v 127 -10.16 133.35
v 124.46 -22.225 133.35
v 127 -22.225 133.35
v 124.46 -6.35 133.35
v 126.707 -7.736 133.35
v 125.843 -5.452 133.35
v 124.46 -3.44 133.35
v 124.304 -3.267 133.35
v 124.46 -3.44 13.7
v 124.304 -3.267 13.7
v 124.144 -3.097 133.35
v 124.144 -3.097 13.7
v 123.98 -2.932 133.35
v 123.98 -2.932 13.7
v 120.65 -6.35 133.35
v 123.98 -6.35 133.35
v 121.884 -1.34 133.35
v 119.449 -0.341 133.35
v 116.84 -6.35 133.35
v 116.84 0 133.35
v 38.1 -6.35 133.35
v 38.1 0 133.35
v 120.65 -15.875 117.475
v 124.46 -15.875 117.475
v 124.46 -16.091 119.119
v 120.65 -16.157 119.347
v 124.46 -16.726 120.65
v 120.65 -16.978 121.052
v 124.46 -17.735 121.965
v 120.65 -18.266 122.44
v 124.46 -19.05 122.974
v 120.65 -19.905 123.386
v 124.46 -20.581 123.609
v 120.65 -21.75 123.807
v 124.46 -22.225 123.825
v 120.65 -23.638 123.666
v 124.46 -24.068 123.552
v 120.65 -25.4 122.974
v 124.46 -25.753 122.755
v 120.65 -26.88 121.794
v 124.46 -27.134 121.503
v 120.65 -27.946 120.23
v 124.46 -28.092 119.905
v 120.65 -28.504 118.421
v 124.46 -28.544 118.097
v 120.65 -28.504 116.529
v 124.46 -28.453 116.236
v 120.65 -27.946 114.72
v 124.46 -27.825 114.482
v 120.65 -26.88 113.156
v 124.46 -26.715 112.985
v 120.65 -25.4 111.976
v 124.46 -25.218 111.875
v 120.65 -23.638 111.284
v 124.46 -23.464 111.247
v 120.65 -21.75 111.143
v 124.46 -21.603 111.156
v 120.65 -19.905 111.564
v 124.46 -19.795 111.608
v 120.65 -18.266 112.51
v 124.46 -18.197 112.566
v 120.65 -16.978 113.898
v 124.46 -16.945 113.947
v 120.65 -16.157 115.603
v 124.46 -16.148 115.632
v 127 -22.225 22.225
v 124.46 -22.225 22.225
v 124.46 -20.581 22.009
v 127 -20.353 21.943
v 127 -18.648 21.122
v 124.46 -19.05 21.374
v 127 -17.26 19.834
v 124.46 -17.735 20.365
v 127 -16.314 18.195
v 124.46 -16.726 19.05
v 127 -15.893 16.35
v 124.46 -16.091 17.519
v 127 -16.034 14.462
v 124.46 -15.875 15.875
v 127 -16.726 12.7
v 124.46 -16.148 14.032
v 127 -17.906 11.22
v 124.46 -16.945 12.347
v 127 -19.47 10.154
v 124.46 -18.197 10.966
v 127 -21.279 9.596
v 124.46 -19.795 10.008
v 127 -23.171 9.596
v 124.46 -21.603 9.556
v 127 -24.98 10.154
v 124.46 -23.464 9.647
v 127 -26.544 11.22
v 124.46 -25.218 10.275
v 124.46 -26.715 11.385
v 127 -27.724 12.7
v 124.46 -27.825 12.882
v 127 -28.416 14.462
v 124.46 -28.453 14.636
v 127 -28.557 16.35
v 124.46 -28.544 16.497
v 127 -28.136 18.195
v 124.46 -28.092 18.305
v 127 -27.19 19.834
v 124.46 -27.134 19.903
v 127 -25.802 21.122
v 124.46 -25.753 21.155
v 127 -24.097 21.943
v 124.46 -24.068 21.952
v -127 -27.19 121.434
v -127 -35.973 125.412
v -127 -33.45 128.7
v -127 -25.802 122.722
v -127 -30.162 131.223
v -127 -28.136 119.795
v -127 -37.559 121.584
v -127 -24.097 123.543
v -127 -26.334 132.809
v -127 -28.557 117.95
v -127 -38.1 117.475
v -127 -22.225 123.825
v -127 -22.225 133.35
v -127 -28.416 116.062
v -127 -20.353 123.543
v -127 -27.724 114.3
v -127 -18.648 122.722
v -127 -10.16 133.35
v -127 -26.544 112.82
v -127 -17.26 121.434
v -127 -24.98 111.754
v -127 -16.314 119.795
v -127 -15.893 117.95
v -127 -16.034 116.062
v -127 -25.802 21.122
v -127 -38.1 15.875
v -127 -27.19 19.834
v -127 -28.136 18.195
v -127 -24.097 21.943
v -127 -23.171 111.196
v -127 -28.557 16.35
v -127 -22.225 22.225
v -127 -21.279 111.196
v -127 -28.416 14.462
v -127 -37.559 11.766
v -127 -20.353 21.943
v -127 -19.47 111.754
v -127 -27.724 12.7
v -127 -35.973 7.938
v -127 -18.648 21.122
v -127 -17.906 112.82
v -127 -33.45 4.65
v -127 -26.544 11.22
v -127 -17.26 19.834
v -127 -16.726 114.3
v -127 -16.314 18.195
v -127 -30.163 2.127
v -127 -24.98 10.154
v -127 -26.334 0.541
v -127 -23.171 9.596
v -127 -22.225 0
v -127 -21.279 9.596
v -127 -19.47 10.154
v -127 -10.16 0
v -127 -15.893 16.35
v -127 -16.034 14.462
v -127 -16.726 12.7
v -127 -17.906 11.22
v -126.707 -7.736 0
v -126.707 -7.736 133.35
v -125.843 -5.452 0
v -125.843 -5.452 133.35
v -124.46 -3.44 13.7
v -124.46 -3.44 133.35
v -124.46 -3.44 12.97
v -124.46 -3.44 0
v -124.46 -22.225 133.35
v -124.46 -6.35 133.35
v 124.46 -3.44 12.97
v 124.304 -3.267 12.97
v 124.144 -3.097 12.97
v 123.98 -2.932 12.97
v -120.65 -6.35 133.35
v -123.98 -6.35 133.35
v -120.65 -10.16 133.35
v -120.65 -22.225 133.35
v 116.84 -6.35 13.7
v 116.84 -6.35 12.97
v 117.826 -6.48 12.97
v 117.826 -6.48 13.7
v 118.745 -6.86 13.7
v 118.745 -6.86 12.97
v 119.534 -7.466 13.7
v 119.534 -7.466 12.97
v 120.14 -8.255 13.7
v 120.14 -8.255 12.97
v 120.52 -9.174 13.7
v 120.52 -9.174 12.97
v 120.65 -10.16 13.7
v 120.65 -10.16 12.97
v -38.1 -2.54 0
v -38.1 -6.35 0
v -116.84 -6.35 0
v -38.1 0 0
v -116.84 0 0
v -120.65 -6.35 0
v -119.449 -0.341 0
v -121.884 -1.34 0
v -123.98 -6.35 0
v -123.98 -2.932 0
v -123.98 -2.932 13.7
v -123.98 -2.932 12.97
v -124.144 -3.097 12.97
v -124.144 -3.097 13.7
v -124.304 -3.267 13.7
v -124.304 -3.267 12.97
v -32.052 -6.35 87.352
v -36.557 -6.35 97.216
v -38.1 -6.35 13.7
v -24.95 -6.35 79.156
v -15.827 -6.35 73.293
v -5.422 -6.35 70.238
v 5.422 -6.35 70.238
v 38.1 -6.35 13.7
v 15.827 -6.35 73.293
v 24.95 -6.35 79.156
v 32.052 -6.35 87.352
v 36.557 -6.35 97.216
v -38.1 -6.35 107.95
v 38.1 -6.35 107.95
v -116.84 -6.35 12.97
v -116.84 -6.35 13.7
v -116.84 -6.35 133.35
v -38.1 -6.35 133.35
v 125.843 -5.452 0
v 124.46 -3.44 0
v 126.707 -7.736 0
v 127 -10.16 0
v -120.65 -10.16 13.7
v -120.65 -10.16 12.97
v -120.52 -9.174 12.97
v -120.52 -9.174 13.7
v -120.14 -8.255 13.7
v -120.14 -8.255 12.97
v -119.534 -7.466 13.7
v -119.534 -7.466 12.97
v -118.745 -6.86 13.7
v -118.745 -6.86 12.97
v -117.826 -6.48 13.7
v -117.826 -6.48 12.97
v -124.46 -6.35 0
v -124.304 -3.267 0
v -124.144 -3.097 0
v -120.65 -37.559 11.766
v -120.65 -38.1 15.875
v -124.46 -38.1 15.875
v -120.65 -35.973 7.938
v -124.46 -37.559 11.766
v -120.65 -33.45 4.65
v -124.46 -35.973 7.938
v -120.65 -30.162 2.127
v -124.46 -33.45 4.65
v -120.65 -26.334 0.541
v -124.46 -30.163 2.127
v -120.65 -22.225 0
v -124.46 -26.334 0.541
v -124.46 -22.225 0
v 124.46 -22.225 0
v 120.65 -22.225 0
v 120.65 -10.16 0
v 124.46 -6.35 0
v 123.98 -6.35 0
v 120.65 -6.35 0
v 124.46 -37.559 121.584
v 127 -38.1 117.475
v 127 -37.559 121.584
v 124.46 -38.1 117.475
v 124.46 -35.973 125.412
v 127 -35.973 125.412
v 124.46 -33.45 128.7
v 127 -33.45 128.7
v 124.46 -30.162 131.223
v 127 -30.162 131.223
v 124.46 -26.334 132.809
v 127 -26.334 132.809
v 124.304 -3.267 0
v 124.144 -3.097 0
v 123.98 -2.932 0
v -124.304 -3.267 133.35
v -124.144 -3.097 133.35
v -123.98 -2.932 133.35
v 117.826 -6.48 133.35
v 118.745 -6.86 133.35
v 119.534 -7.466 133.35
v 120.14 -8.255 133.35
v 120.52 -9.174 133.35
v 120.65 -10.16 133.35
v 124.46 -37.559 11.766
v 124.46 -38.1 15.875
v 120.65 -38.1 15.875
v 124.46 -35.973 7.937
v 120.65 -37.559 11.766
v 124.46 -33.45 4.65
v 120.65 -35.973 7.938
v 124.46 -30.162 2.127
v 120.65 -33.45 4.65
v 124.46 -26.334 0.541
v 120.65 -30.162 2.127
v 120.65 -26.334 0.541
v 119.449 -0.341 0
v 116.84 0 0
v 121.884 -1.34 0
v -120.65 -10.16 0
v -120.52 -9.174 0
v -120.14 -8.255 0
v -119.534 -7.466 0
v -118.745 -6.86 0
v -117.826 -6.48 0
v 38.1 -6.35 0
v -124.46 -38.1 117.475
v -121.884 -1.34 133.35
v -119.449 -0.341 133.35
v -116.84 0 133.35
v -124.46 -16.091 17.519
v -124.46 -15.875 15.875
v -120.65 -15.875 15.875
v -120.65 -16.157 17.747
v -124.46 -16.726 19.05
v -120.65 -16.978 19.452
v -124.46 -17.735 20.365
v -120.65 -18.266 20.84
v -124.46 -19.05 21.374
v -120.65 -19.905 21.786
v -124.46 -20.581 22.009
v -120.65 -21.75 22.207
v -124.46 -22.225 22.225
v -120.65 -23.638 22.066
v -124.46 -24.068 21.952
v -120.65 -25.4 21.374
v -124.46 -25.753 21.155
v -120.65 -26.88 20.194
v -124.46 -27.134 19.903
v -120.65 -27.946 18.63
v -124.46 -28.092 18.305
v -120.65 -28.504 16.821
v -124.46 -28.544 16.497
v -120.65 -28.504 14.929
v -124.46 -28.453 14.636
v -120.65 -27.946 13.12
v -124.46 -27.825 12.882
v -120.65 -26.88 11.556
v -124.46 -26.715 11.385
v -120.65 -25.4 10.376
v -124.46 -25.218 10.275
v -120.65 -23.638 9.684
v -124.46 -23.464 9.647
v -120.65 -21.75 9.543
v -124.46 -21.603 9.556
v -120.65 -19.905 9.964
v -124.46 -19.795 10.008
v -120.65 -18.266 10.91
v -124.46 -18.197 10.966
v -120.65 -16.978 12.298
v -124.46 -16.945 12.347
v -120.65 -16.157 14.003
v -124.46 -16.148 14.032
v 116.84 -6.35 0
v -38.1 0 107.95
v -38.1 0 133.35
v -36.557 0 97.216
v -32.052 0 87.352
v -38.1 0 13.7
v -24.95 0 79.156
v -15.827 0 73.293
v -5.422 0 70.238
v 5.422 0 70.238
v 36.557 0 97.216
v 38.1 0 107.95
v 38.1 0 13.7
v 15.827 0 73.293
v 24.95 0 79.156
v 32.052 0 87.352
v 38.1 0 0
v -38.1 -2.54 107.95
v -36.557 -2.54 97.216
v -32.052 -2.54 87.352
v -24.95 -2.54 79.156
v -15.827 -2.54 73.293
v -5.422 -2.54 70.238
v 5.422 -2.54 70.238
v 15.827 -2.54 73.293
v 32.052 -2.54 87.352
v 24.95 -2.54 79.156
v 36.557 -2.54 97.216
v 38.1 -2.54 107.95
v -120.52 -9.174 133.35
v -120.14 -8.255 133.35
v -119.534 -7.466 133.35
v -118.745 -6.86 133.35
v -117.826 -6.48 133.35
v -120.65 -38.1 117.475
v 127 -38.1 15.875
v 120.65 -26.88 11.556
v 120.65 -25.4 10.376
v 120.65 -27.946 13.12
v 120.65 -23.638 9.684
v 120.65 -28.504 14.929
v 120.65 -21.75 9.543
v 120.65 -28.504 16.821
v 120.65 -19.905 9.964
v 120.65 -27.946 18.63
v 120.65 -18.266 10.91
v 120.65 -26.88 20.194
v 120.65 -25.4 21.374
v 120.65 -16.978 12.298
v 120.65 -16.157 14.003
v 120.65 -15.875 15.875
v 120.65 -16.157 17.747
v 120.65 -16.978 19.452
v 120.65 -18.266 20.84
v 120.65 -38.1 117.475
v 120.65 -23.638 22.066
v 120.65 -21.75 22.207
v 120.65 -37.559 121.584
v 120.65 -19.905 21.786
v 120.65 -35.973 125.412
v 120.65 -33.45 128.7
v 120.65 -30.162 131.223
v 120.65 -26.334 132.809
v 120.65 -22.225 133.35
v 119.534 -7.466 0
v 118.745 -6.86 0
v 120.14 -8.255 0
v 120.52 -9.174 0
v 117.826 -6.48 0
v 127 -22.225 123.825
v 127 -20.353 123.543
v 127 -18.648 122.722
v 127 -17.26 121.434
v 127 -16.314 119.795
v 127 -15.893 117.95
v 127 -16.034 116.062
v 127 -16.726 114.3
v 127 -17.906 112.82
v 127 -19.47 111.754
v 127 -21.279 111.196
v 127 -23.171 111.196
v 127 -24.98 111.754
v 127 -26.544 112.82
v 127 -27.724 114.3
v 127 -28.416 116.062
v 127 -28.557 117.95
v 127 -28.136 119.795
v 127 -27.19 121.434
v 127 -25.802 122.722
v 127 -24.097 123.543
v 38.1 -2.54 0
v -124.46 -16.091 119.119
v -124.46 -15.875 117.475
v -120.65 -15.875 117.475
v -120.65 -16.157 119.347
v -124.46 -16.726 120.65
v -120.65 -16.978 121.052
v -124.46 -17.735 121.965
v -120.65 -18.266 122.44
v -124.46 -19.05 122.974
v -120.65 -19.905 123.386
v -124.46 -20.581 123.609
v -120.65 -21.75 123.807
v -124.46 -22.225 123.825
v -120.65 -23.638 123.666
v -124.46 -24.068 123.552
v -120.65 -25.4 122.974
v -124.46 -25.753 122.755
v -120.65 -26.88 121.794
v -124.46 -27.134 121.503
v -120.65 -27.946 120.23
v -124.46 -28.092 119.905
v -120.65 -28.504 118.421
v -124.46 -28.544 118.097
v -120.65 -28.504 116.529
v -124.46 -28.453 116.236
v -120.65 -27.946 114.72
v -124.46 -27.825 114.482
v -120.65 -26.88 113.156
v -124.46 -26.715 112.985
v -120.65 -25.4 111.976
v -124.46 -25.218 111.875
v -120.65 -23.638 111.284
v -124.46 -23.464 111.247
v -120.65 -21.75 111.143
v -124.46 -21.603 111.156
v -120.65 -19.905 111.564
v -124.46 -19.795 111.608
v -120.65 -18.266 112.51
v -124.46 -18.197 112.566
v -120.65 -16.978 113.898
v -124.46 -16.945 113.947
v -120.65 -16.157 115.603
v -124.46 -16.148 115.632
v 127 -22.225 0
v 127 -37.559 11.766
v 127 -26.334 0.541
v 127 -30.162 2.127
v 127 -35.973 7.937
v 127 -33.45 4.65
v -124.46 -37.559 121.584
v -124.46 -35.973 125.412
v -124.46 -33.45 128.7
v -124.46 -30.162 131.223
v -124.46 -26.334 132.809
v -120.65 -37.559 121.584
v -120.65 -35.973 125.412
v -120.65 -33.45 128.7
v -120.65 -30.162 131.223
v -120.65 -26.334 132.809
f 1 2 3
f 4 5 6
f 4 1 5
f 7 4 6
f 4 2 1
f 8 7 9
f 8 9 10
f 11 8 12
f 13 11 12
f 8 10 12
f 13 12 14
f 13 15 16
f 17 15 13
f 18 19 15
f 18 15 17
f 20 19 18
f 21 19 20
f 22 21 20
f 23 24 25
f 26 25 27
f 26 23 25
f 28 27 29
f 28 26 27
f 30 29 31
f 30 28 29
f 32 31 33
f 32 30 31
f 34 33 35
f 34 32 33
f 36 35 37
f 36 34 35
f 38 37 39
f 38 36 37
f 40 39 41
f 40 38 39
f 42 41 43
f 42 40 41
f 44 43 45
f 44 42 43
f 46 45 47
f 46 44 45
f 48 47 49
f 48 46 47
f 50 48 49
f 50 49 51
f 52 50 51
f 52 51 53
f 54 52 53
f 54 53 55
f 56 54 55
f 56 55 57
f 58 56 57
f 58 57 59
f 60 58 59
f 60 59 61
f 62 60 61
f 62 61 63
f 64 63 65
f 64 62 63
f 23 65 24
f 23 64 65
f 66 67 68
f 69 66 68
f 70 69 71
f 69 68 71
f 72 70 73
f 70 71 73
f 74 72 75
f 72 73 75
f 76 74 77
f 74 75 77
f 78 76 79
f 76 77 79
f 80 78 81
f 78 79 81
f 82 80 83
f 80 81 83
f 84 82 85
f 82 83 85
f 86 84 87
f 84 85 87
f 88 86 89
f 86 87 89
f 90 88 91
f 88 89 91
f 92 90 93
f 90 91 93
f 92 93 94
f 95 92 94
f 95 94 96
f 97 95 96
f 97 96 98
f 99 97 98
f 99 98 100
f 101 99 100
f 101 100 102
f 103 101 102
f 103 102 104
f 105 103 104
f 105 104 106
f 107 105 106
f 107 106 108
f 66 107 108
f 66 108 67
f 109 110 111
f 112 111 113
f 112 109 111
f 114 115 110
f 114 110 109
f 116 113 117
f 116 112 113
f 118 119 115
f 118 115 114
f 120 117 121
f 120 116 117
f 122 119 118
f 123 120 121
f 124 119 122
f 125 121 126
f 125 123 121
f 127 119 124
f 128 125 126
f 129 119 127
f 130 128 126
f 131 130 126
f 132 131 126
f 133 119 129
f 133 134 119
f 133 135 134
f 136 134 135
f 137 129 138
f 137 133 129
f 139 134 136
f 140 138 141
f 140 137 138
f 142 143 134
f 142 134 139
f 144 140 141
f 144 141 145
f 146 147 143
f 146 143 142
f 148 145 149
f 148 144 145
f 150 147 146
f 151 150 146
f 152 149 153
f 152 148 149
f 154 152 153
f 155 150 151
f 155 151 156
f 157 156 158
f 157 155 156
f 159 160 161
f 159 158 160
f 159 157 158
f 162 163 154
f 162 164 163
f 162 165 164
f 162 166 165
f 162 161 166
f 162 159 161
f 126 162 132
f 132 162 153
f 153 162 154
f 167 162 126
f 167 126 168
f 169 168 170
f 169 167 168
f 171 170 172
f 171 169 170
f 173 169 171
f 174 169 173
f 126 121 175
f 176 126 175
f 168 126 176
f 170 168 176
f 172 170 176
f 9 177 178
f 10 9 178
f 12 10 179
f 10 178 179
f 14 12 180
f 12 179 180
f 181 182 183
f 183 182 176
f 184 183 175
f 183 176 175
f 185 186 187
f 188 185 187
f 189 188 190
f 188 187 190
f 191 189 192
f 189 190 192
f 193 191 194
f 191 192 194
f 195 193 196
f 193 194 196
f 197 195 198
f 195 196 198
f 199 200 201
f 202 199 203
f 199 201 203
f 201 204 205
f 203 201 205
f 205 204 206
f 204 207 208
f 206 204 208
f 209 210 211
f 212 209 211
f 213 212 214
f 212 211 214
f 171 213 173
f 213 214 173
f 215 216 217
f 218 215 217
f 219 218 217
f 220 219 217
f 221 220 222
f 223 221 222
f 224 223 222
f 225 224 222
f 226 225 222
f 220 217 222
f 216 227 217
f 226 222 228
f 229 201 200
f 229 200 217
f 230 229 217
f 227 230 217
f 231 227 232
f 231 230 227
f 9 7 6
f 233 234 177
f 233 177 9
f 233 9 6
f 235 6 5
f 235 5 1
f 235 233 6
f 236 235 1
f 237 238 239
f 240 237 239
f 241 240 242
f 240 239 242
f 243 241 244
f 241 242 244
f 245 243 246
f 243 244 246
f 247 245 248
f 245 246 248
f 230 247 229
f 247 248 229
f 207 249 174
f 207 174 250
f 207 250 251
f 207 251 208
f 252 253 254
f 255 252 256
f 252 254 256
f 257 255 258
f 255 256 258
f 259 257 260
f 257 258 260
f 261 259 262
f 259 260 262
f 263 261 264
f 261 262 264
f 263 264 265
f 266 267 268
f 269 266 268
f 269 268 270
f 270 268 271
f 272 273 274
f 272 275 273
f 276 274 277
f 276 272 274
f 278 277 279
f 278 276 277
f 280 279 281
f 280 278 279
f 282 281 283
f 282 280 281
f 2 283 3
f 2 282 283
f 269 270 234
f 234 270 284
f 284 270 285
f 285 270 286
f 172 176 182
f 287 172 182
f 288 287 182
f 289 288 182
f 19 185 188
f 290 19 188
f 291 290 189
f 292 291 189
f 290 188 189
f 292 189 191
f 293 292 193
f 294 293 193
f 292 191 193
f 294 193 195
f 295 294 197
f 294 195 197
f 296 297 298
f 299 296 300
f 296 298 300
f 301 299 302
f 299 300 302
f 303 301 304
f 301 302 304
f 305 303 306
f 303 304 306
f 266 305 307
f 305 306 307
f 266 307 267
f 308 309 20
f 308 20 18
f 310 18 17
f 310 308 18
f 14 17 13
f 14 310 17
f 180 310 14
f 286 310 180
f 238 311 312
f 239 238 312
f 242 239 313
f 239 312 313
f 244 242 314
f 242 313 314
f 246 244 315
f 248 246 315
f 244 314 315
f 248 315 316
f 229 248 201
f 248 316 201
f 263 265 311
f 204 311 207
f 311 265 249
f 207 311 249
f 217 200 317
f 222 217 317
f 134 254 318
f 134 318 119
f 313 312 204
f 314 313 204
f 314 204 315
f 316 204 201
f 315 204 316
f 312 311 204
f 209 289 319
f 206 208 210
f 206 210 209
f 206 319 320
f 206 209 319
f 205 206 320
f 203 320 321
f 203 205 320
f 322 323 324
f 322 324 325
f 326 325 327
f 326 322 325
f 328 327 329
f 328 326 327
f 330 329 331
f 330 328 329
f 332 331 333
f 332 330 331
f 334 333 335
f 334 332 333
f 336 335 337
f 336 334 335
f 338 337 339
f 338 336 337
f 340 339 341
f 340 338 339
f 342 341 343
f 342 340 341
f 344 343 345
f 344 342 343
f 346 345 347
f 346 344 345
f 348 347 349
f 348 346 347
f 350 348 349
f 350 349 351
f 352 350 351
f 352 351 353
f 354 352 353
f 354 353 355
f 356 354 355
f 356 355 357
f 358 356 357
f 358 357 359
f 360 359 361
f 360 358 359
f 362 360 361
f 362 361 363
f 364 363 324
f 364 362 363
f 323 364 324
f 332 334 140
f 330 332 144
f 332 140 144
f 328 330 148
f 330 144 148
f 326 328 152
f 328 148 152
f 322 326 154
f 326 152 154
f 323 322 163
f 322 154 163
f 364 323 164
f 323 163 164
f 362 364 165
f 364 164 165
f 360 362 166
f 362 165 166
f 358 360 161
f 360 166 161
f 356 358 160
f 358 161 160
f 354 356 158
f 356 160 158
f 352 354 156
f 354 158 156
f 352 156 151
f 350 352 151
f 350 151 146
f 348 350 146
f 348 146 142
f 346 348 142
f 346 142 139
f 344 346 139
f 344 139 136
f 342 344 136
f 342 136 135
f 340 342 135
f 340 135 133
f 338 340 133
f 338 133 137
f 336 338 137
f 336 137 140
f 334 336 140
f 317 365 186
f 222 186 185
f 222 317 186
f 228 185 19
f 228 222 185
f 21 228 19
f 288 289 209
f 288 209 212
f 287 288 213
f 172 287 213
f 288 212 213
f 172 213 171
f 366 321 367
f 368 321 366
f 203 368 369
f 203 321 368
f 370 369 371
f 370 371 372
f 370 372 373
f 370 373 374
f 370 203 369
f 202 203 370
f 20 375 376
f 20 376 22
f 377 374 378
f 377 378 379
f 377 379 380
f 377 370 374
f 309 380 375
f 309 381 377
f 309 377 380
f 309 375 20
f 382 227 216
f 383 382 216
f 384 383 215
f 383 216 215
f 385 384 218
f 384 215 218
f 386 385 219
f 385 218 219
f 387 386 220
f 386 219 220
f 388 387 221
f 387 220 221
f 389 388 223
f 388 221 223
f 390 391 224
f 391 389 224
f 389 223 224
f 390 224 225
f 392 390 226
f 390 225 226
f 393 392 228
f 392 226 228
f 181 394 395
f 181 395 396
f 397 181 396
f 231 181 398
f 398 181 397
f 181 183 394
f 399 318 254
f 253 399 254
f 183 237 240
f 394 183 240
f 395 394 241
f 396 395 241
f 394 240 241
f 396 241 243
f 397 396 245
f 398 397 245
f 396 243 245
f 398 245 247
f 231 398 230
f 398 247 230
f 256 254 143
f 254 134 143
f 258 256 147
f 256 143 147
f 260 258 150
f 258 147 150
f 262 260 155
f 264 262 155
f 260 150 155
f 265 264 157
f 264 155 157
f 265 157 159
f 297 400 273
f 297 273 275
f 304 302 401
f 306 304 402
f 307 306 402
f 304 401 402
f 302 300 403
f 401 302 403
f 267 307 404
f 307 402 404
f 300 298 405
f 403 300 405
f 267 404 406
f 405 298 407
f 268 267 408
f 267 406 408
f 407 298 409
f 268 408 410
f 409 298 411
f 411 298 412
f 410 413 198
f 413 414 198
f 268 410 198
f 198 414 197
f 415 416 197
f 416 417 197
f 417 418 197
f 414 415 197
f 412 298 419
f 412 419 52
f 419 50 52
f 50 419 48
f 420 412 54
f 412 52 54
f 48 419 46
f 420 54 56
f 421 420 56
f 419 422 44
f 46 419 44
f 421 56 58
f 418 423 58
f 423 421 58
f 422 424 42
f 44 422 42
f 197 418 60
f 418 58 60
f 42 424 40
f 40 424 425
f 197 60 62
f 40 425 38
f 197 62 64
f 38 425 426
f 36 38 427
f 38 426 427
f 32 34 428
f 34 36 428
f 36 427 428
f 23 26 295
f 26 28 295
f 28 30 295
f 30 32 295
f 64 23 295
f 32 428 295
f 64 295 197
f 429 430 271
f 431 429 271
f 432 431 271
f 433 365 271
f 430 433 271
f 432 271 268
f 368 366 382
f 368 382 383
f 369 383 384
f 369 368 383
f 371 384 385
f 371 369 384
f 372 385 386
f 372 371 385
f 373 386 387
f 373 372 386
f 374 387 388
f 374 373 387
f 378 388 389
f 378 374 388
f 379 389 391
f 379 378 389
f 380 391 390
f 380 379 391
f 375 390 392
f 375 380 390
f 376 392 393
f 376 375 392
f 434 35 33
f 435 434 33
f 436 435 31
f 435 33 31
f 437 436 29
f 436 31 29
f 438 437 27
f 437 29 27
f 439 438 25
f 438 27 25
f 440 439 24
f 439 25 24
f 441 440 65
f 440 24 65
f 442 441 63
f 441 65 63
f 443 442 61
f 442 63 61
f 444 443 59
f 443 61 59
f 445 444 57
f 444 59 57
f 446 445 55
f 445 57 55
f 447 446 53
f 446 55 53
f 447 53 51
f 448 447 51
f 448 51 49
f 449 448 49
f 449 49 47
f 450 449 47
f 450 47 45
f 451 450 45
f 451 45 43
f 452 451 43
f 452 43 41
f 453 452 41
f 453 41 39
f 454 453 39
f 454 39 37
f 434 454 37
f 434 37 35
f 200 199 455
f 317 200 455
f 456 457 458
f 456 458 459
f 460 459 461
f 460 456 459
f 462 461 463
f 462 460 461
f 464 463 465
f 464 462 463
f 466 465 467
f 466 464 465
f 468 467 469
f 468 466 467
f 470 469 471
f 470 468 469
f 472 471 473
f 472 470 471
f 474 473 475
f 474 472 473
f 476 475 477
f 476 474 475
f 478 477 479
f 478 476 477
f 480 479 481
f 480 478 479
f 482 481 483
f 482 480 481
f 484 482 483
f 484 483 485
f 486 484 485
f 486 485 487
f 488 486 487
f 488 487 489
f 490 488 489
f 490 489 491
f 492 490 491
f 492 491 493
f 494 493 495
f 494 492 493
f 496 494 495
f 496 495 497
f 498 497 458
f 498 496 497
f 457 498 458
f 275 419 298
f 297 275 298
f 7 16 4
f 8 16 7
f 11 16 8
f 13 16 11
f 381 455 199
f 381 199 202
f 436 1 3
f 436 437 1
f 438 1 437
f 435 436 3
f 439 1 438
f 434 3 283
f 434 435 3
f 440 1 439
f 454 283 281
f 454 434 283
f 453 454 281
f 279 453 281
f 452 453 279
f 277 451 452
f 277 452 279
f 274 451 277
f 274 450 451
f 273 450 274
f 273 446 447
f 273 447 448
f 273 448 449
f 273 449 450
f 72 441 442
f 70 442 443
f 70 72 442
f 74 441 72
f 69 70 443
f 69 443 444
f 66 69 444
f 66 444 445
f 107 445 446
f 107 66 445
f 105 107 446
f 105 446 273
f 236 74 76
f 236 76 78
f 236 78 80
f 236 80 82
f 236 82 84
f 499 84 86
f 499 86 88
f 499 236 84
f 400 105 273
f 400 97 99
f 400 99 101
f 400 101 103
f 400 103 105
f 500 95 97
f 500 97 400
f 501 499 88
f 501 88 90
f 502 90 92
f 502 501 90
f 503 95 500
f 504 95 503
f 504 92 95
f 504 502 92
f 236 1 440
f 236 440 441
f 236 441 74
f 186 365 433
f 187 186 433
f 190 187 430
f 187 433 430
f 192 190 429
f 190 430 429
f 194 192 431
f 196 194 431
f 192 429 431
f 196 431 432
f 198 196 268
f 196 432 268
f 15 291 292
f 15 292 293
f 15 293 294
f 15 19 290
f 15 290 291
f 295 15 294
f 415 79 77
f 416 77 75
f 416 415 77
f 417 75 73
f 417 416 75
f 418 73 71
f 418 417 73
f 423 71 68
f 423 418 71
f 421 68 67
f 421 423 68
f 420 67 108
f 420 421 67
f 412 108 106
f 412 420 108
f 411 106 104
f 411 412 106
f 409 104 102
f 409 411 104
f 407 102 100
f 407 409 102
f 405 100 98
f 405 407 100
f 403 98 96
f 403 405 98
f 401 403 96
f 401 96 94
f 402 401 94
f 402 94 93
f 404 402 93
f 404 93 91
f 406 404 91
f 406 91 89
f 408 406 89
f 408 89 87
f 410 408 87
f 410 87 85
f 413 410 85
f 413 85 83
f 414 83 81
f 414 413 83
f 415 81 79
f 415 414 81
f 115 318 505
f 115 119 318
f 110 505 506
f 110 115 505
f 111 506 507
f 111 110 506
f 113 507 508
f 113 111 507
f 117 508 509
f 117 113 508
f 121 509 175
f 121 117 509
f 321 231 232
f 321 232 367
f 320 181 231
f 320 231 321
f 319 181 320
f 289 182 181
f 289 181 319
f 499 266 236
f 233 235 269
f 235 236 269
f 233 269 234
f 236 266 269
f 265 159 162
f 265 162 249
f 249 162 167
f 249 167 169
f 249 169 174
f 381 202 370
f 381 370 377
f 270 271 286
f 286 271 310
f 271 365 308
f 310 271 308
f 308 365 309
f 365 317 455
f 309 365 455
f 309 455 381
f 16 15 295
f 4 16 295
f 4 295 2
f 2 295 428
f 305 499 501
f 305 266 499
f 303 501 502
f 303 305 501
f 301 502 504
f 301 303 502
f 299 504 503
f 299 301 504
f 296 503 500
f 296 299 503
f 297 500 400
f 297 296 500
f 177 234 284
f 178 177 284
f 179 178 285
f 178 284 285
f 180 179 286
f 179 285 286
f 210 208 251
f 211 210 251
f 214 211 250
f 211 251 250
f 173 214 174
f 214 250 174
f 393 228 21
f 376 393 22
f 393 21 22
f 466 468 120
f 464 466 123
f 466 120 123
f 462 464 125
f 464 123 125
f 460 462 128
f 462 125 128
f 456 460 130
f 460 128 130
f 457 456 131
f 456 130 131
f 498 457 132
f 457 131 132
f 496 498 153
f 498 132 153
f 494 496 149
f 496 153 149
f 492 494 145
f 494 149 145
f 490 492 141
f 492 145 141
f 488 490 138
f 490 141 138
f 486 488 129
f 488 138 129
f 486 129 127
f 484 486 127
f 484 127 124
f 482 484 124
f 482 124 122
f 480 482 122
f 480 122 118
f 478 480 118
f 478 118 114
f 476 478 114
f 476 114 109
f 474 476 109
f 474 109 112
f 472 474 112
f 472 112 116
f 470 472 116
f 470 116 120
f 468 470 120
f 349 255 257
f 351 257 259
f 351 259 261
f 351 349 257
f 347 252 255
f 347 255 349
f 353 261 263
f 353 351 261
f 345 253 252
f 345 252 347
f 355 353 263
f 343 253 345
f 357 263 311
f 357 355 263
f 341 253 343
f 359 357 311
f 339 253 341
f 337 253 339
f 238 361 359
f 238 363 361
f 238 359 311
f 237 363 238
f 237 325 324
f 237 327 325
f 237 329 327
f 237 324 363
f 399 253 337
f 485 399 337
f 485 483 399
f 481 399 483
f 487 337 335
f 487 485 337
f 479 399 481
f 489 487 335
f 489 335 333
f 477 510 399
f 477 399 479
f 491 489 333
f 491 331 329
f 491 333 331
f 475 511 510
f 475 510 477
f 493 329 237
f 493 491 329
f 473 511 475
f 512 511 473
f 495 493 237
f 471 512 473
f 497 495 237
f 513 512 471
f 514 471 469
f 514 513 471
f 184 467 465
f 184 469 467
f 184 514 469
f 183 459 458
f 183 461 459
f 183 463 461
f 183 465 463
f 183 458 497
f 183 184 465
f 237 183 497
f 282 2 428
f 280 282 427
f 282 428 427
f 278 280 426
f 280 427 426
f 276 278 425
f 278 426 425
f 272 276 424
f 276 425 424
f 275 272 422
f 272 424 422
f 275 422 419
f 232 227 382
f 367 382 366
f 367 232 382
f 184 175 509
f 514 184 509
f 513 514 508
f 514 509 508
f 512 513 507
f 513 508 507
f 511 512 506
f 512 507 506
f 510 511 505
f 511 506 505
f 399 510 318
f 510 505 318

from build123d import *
from build123d.topology import SkipClean

# Parameters (mm, degrees)
EXTRUDE_THIN1_DEPTH        = 133.35
CUT_EXTRUDE1_DEPTH         = 189.050079766
SKETCH3_R                  = 6.35
CUT_EXTRUDE2_DEPTH         = 290.395633174
FILLET1_R                  = 15.875
CONVERT_SOLID1_START       = -123.9798384
CONVERT_SOLID1_OUTLINE_W   = 3.81
CONVERT_SOLID1_OUTLINE_H   = 133.35
CONVERT_SOLID1_DEPTH       = 85.8798384
CONVERT_SOLID1_START_2     = 38.1
CONVERT_SOLID1_2_OUTLINE_W = 3.81
CONVERT_SOLID1_2_OUTLINE_H = 133.35
CONVERT_SOLID1_2_DEPTH     = 85.8798384
CONVERT_SOLID1_START_3     = -124.46
CONVERT_SOLID1_3_OUTLINE_R = 6.35
CONVERT_SOLID1_3_DEPTH     = 3.81
CONVERT_SOLID1_START_4     = 120.65
CONVERT_SOLID1_4_OUTLINE_R = 6.35
CONVERT_SOLID1_4_DEPTH     = 3.81
CONVERT_SOLID1_5_OUTLINE_W = 76.2
CONVERT_SOLID1_5_OUTLINE_H = 6.35
CONVERT_SOLID1_5_DEPTH     = 13.700379
CONVERT_SOLID1_START_5     = 12.969621
CONVERT_SOLID1_6_DEPTH     = 120.380379
CONVERT_SOLID1_START_6     = -6.35
CONVERT_SOLID1_7_DEPTH     = 3.81
CONVERT_SOLID1_START_7     = -1
CONVERT_SOLID1_8_DEPTH     = 134.35


with BuildPart() as part:
    # Sketch1 → Extrude-Thin1 (new body)
    with BuildSketch(Plane.XY):
        Polygon((-127, -38.1), (-127, 0), (127, 0), (127, -38.1), (124.46, -38.1), (124.46, -2.54), (-124.46, -2.54), (-124.46, -38.1), align=None)
    extrude(amount=EXTRUDE_THIN1_DEPTH)

    # Sketch2 → Cut-Extrude1 (cut, through all)
    with BuildSketch(Plane(origin=(0, 0, 0), x_dir=(1, 0, 0), z_dir=(0, 1, 0))):
        with BuildLine():
            Line((38.1, -107.95), (38.1, -133.35))
            Line((38.1, -133.35), (-38.1, -133.35))
            Line((-38.1, -133.35), (-38.1, -107.95))
            ThreePointArc((-38.1, -107.95), (0, -69.85), (38.1, -107.95))
        make_face()
    extrude(amount=-CUT_EXTRUDE1_DEPTH, mode=Mode.SUBTRACT)

    # Sketch3 → Cut-Extrude2 (cut, through all)
    with BuildSketch(Plane.ZY.offset(127)):
        with Locations((15.875, -22.225)):
            Circle(SKETCH3_R)
        with Locations((117.475, -22.225)):
            Circle(SKETCH3_R)
    extrude(amount=-CUT_EXTRUDE2_DEPTH, mode=Mode.SUBTRACT)

    # Fillet1
    fillet1_edges = [part.edges().sort_by_distance(p)[0] for p in [
        (125.73, -38.1, 133.35),
        (125.73, -38.1, 0),
        (-125.73, -38.1, 133.35),
        (-125.73, -38.1, 0),
    ]]
    fillet(fillet1_edges, radius=FILLET1_R)

    # Convert-Solid1: read off the stored shape, not the designer's step
    # Convert-Solid1 outline → Convert-Solid1 (add)
    with BuildSketch(Plane.YZ.offset(CONVERT_SOLID1_START)):
        with Locations((-4.445, 66.675)):
            Rectangle(CONVERT_SOLID1_OUTLINE_W, CONVERT_SOLID1_OUTLINE_H)
    extrude(amount=CONVERT_SOLID1_DEPTH)

    # Convert-Solid1 2 outline → Convert-Solid1 2 (add)
    with BuildSketch(Plane.YZ.offset(CONVERT_SOLID1_START_2)):
        with Locations((-4.445, 66.675)):
            Rectangle(CONVERT_SOLID1_2_OUTLINE_W, CONVERT_SOLID1_2_OUTLINE_H)
    extrude(amount=CONVERT_SOLID1_2_DEPTH)

    # Convert-Solid1 3 outline → Convert-Solid1 3 (add)
    with SkipClean():  # the faces are left unmerged after this step: merging them gives an invalid solid
        with BuildSketch(Plane.YZ.offset(CONVERT_SOLID1_START_3)):
            with BuildLine():
                Line((-22.225, 0), (-6.35, 0))
                Line((-6.35, 0), (-6.35, 133.35))
                Line((-6.35, 133.35), (-22.225, 133.35))
                ThreePointArc((-22.225, 133.35), (-33.450320151, 128.700320151), (-38.1, 117.475))
                Line((-38.1, 117.475), (-38.1, 15.875))
                ThreePointArc((-38.1, 15.875), (-33.450320151, 4.649679849), (-22.225, 0))
            make_face()
            with Locations((-22.225, 15.875)):
                Circle(CONVERT_SOLID1_3_OUTLINE_R, mode=Mode.SUBTRACT)
            with Locations((-22.225, 117.475)):
                Circle(CONVERT_SOLID1_3_OUTLINE_R, mode=Mode.SUBTRACT)
        extrude(amount=CONVERT_SOLID1_3_DEPTH)

    # Convert-Solid1 4 outline → Convert-Solid1 4 (add)
    with SkipClean():  # the faces are left unmerged after this step: merging them gives an invalid solid
        with BuildSketch(Plane.YZ.offset(CONVERT_SOLID1_START_4)):
            with BuildLine():
                Line((-22.225, 0), (-6.35, 0))
                Line((-6.35, 0), (-6.35, 133.35))
                Line((-6.35, 133.35), (-22.225, 133.35))
                ThreePointArc((-22.225, 133.35), (-33.450320151, 128.700320151), (-38.1, 117.475))
                Line((-38.1, 117.475), (-38.1, 15.875))
                ThreePointArc((-38.1, 15.875), (-33.450320151, 4.649679849), (-22.225, 0))
            make_face()
            with Locations((-22.225, 15.875)):
                Circle(CONVERT_SOLID1_4_OUTLINE_R, mode=Mode.SUBTRACT)
            with Locations((-22.225, 117.475)):
                Circle(CONVERT_SOLID1_4_OUTLINE_R, mode=Mode.SUBTRACT)
        extrude(amount=CONVERT_SOLID1_4_DEPTH)

    # Convert-Solid1 5 outline → Convert-Solid1 5 (add)
    with SkipClean():  # the faces are left unmerged after this step: merging them gives an invalid solid
        with BuildSketch(Plane.XY):
            with BuildLine():
                Line((120.65, -6.35), (116.84, -6.35))
                ThreePointArc((116.84, -6.35), (119.534076836, -7.465923164), (120.65, -10.16))
                Line((120.65, -10.16), (120.65, -6.35))
            make_face()
            with BuildLine():
                ThreePointArc((-120.65, -10.16), (-119.534076836, -7.465923164), (-116.84, -6.35))
                Line((-116.84, -6.35), (-120.65, -6.35))
                Line((-120.65, -6.35), (-120.65, -10.16))
            make_face()
            with Locations((0, -3.175)):
                Rectangle(CONVERT_SOLID1_5_OUTLINE_W, CONVERT_SOLID1_5_OUTLINE_H)
            with BuildLine():
                ThreePointArc((124.46, -3.43979167), (124.224290518, -3.181615262), (123.9798384, -2.931700918))
                Line((123.9798384, -2.931700918), (123.9798384, -6.35))
                Line((123.9798384, -6.35), (124.46, -6.35))
                Line((124.46, -6.35), (124.46, -3.43979167))
            make_face()
            with BuildLine():
                Line((-123.9798384, -6.35), (-123.9798384, -2.931700918))
                ThreePointArc((-123.9798384, -2.931700918), (-124.224290518, -3.181615262), (-124.46, -3.43979167))
                Line((-124.46, -3.43979167), (-124.46, -6.35))
                Line((-124.46, -6.35), (-123.9798384, -6.35))
            make_face()
        extrude(amount=CONVERT_SOLID1_5_DEPTH)

    # Convert-Solid1 6 outline → Convert-Solid1 6 (add)
    with SkipClean():  # the faces are left unmerged after this step: merging them gives an invalid solid
        with BuildSketch(Plane.XY.offset(CONVERT_SOLID1_START_5)):
            with BuildLine():
                Line((120.65, -6.35), (116.84, -6.35))
                ThreePointArc((116.84, -6.35), (119.534076836, -7.465923164), (120.65, -10.16))
                Line((120.65, -10.16), (120.65, -6.35))
            make_face()
            with BuildLine():
                ThreePointArc((-120.65, -10.16), (-119.534076836, -7.465923164), (-116.84, -6.35))
                Line((-116.84, -6.35), (-120.65, -6.35))
                Line((-120.65, -6.35), (-120.65, -10.16))
            make_face()
            with BuildLine():
                ThreePointArc((124.46, -3.43979167), (124.224290518, -3.181615262), (123.9798384, -2.931700918))
                Line((123.9798384, -2.931700918), (123.9798384, -6.35))
                Line((123.9798384, -6.35), (124.46, -6.35))
                Line((124.46, -6.35), (124.46, -3.43979167))
            make_face()
            with BuildLine():
                Line((-123.9798384, -6.35), (-123.9798384, -2.931700918))
                ThreePointArc((-123.9798384, -2.931700918), (-124.224290518, -3.181615262), (-124.46, -3.43979167))
                Line((-124.46, -3.43979167), (-124.46, -6.35))
                Line((-124.46, -6.35), (-123.9798384, -6.35))
            make_face()
        extrude(amount=CONVERT_SOLID1_6_DEPTH)

    # Convert-Solid1 7 outline → Convert-Solid1 7 (add)
    with SkipClean():  # the faces are left unmerged after this step: merging them gives an invalid solid
        with BuildSketch(Plane(origin=(0, 0, 0), x_dir=(1, 0, 0), z_dir=(0, 1, 0)).offset(CONVERT_SOLID1_START_6)):
            with BuildLine():
                ThreePointArc((-38.1, -107.95), (0, -69.85), (38.1, -107.95))
                Line((38.1, -107.95), (38.1, 0))
                Line((38.1, 0), (-38.1, 0))
                Line((-38.1, 0), (-38.1, -107.95))
            make_face()
        extrude(amount=CONVERT_SOLID1_7_DEPTH)

    # Convert-Solid1 8 outline → Convert-Solid1 8 (cut)
    with SkipClean():  # the faces are left unmerged after this step: merging them gives an invalid solid
        with BuildSketch(Plane.XY.offset(CONVERT_SOLID1_START_7)):
            with BuildLine():
                Line((127, 0), (116.84, 0))
                ThreePointArc((116.84, 0), (120.699150251, -0.761459723), (123.9798384, -2.931700918))
                Line((123.9798384, -2.931700918), (123.9798384, -2.54))
                Line((123.9798384, -2.54), (124.46, -2.54))
                Line((124.46, -2.54), (124.46, -3.43979167))
                ThreePointArc((124.46, -3.43979167), (126.343809762, -6.567897551), (127, -10.16))
                Line((127, -10.16), (127, 0))
            make_face()
            with BuildLine():
                ThreePointArc((-123.9798384, -2.931700918), (-120.699150251, -0.761459723), (-116.84, 0))
                Line((-116.84, 0), (-127, 0))
                Line((-127, 0), (-127, -10.16))
                ThreePointArc((-127, -10.16), (-126.343809762, -6.567897551), (-124.46, -3.43979167))
                Line((-124.46, -3.43979167), (-124.46, -2.54))
                Line((-124.46, -2.54), (-123.9798384, -2.54))
                Line((-123.9798384, -2.54), (-123.9798384, -2.931700918))
            make_face()
        extrude(amount=CONVERT_SOLID1_8_DEPTH, mode=Mode.SUBTRACT)


solid = part.part
